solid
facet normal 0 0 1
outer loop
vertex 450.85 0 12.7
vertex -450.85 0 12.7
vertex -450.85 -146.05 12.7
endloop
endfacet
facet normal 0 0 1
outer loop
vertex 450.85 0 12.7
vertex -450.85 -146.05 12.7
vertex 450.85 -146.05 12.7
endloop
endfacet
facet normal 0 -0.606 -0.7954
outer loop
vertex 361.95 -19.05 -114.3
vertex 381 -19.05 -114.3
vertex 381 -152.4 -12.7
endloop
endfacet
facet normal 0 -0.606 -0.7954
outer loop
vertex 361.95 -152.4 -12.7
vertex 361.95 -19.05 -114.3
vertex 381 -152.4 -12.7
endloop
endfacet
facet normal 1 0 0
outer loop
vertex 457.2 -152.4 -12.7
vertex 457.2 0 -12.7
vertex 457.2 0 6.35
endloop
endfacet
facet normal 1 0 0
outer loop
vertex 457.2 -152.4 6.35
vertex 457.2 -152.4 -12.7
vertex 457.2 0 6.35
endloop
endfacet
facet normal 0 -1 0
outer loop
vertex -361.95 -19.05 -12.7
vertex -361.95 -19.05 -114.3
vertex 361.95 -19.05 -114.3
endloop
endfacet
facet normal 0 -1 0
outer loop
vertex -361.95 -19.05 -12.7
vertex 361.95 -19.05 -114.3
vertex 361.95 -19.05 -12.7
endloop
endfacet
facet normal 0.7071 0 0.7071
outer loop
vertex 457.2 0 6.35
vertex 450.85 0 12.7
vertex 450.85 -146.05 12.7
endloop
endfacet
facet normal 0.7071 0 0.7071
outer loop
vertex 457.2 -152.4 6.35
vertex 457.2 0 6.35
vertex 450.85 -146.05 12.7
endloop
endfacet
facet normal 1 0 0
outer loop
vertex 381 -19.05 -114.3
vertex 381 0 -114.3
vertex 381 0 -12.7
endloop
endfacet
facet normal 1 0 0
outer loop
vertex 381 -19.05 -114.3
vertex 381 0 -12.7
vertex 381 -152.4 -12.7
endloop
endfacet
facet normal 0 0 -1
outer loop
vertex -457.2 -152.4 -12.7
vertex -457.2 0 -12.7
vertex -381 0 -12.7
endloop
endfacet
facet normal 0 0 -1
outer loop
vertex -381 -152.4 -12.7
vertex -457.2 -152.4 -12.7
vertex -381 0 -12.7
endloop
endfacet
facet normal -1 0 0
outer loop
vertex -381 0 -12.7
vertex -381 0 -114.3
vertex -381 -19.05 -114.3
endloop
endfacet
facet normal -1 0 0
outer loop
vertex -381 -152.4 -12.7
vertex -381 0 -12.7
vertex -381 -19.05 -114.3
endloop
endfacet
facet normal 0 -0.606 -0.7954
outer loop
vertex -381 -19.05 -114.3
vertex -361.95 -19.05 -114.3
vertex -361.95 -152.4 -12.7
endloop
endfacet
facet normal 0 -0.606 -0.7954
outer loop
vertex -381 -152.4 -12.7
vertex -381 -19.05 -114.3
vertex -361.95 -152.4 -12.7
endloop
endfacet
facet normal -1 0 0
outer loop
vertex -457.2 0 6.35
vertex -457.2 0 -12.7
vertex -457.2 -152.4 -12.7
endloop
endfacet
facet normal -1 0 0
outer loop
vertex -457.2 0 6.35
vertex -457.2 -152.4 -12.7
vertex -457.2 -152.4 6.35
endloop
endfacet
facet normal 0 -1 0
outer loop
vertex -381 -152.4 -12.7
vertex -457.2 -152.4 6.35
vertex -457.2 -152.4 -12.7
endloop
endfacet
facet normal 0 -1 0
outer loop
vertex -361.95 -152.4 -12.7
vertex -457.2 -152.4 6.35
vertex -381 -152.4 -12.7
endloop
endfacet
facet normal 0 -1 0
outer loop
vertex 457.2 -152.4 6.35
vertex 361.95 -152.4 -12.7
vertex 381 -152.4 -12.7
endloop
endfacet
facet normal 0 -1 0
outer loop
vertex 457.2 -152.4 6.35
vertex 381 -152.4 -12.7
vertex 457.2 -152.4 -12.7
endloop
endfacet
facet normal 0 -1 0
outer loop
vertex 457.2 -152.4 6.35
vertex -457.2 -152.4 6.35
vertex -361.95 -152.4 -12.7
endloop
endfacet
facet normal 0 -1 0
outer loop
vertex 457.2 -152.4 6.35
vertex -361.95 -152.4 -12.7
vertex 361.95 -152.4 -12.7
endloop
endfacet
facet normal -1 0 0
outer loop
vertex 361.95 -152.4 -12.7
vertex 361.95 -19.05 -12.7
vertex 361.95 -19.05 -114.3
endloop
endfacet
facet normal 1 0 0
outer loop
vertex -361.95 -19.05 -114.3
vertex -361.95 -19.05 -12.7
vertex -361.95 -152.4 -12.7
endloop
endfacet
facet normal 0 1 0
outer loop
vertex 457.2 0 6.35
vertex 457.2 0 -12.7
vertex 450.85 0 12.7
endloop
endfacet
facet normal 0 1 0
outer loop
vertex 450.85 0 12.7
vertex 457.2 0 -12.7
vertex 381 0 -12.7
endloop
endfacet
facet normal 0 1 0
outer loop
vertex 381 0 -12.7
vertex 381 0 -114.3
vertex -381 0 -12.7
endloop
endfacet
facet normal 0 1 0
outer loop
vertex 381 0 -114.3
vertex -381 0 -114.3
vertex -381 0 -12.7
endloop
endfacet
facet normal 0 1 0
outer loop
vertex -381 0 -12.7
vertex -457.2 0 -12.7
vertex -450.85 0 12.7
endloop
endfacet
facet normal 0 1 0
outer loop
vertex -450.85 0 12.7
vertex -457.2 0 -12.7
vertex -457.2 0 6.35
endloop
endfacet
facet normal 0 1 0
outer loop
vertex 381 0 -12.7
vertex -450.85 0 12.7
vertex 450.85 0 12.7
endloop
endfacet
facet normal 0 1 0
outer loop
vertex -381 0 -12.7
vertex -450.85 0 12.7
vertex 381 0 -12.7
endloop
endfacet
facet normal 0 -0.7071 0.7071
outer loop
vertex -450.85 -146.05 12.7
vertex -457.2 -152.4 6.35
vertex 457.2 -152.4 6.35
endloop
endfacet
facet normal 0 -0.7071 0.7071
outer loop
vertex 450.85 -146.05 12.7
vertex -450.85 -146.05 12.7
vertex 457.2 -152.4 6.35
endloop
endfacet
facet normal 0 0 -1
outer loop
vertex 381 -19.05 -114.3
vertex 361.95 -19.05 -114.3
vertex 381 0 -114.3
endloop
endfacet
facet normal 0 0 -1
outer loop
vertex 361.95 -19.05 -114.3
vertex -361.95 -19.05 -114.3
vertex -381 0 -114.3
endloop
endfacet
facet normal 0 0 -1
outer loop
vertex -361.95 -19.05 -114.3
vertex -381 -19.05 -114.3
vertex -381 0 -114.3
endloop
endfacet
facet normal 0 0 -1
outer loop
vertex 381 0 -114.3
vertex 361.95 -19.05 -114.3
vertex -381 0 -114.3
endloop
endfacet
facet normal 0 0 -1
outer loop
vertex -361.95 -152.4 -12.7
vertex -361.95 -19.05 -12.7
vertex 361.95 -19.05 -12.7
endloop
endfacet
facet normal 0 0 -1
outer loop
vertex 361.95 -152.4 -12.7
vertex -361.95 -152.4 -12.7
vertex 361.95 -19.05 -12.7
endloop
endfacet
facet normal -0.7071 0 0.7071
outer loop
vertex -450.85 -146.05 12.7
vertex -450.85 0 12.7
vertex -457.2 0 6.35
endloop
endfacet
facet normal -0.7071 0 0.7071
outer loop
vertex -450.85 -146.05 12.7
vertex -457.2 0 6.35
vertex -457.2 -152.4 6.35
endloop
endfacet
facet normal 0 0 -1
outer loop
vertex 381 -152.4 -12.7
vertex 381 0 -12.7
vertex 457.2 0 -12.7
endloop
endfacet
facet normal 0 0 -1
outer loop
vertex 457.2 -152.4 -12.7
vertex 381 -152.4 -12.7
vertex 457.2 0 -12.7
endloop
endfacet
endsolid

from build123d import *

# Parameters (mm, degrees)
F0_W     = 914.4
F0_H     = 25.4
F1_DEPTH = 152.4
F2_SIZE  = 6.35
F3_W     = 19.05
F3_H     = 152.4
F4_DEPTH = 101.6
F6_DEPTH = 838.201
F7_W     = 19.05
F7_H     = 101.6
F8_DEPTH = 723.9


with BuildPart() as f1:
    # F0 (on Front) → F1 (new body)
    with BuildSketch(Plane.XZ):
        Rectangle(F0_W, F0_H)
    extrude(amount=F1_DEPTH)

    # F2
    f2_edges = [f1.edges().sort_by_distance(p)[0] for p in [
        (-457.2, -76.2, 12.7),
        (0, -152.4, 12.7),
        (457.2, -76.2, 12.7),
    ]]
    chamfer(f2_edges, length=F2_SIZE)

    # F3 (on face) → F4 (join)
    with BuildSketch(Plane(origin=(0, 0, -12.7), x_dir=(1, 0, 0), z_dir=(0, 0, -1))):
        with Locations((-371.475, 76.2)):
            Rectangle(F3_W, F3_H)
        with Locations((371.475, 76.2)):
            Rectangle(F3_W, F3_H)
    extrude(amount=F4_DEPTH)

    # F5 (on face) → F6 (cut, through all)
    with BuildSketch(Plane.YZ.offset(381)):
        Polygon((-19.05, -114.3), (-152.4, -12.7), (-152.4, -114.3), align=None)
    extrude(amount=-F6_DEPTH, mode=Mode.SUBTRACT)

    # F7 (on face) → F8 (join, through all)
    with BuildSketch(Plane.YZ.offset(-361.95)):
        with Locations((-9.525, -63.5)):
            Rectangle(F7_W, F7_H)
    extrude(amount=F8_DEPTH)


solid = f1.part
